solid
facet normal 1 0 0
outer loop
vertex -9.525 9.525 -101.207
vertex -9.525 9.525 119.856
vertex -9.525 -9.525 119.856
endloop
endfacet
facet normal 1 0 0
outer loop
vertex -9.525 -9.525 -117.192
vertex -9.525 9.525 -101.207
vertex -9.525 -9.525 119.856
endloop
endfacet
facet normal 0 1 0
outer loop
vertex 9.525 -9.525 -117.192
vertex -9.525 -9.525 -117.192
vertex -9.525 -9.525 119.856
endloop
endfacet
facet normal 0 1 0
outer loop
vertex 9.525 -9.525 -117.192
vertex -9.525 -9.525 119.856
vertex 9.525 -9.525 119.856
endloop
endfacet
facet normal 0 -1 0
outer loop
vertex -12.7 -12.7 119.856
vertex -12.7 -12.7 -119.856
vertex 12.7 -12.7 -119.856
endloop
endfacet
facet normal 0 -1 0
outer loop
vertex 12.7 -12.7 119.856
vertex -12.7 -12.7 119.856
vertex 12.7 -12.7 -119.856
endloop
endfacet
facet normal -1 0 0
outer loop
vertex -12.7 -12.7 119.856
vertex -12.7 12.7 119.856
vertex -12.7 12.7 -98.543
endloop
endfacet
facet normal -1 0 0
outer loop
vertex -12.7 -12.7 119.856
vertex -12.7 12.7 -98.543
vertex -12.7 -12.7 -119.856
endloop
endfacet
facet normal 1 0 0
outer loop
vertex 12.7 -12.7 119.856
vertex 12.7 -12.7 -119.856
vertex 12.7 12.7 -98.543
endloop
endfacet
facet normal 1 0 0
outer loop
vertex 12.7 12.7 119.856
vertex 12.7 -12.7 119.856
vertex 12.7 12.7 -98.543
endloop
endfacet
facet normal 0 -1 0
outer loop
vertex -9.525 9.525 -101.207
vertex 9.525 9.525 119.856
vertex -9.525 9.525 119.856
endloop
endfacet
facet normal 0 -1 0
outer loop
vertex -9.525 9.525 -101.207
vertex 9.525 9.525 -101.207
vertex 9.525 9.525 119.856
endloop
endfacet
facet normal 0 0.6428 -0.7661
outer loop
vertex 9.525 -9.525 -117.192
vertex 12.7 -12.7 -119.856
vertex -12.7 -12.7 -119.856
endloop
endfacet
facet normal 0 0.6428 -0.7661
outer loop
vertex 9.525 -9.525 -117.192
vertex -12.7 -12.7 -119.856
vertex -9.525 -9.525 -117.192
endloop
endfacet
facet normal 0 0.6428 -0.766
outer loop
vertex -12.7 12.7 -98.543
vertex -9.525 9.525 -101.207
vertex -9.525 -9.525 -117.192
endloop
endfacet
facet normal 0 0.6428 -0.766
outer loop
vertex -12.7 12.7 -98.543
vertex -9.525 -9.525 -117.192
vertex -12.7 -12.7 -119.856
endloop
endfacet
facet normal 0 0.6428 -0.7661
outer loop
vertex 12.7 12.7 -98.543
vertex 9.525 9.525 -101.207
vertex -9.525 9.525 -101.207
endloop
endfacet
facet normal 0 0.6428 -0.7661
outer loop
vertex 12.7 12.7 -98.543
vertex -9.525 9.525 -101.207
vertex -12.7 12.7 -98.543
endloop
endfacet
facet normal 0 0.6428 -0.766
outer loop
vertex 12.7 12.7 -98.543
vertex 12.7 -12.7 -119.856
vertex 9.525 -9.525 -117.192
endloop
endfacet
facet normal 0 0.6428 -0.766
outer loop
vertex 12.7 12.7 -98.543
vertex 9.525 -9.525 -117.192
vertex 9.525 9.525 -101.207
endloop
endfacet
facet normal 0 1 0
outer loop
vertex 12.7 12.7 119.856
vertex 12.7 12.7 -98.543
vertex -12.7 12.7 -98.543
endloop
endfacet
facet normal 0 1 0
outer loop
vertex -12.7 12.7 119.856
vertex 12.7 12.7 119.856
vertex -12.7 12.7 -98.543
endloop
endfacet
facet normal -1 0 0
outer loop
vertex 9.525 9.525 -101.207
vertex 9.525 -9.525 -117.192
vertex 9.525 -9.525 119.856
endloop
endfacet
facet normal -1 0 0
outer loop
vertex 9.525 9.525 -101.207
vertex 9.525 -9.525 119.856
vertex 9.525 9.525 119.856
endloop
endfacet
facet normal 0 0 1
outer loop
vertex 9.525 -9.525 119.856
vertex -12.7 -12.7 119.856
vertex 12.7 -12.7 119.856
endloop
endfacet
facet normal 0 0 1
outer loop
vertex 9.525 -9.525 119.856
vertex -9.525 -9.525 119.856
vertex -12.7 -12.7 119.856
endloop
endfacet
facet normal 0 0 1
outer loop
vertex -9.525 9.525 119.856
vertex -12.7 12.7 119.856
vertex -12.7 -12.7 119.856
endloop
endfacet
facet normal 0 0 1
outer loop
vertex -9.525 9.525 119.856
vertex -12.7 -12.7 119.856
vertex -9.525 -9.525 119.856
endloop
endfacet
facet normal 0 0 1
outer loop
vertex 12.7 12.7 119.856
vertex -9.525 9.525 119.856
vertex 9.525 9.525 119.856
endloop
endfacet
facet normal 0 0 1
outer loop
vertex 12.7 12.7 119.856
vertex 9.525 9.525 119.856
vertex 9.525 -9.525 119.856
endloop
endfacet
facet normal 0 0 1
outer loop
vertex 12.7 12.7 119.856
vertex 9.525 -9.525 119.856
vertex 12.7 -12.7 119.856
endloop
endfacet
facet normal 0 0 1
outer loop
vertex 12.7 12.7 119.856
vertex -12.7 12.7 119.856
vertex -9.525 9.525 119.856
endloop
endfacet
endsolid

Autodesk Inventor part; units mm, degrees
ref_plane "YZ Plane" through (0, 0, 0) normal (1, 0, 0) x (0, 1, 0)
ref_plane "XZ Plane" through (0, 0, 0) normal (0, 1, 0) x (-1, 0, 0)
ref_plane "XY Plane" through (0, 0, 0) normal (0, 0, 1) x (1, 0, 0)
sketch "Sketch1" plane through (0, 0, 0) normal (0, 0, 1) x (1, 0, 0)
  line L0 (-12.7, -12.7) -> (12.7, -12.7)
  line L1 (12.7, -12.7) -> (12.7, 12.7)
  line L2 (12.7, 12.7) -> (-12.7, 12.7)
  line L3 (-12.7, 12.7) -> (-12.7, -12.7)
  line L4 (-12.7, -12.7) -> (12.7, 12.7) construction
  line L5 (12.7, -12.7) -> (-12.7, 12.7) construction
  line L6 (-9.525, -9.525) -> (9.525, -9.525)
  line L7 (9.525, -9.525) -> (9.525, 9.525)
  line L8 (9.525, 9.525) -> (-9.525, 9.525)
  line L9 (-9.525, 9.525) -> (-9.525, -9.525)
  line L10 (-9.525, -9.525) -> (9.525, 9.525) construction
  line L11 (9.525, -9.525) -> (-9.525, 9.525) construction
  point P0 (0, 0)
  dimension "d0" = 25.4
  dimension "d1" = 25.4
  dimension "d2" = 3.175
extrude "Extrusion1" add sketch "Sketch1" along normal mid plane 239.7125
sketch "Sketch4" plane through (12.7, -12.7, 119.8563) normal (1, 0, 0) x (0, 0, -1)
  line L0 (239.7125, 0) -> (239.7125, 25.4) projected
  line L1 (239.7125, 0) -> (218.3994, 25.4)
  line L2 (239.7125, 25.4) -> (0, 25.4) projected
  line L3 (218.3994, 25.4) -> (239.7125, 25.4)
  line L4 (0, 22.225) -> (239.7125, 22.225) projected
  line L5 (239.7125, 25.4) -> (239.7125, 0)
  point P0 (119.8563, 12.7)
  dimension "d9" = 40
extrude "Extrusion3" cut sketch "Sketch4" against normal through all
properties part number "Aluminum1x1MiddleFront" material "Aluminum 6061"
